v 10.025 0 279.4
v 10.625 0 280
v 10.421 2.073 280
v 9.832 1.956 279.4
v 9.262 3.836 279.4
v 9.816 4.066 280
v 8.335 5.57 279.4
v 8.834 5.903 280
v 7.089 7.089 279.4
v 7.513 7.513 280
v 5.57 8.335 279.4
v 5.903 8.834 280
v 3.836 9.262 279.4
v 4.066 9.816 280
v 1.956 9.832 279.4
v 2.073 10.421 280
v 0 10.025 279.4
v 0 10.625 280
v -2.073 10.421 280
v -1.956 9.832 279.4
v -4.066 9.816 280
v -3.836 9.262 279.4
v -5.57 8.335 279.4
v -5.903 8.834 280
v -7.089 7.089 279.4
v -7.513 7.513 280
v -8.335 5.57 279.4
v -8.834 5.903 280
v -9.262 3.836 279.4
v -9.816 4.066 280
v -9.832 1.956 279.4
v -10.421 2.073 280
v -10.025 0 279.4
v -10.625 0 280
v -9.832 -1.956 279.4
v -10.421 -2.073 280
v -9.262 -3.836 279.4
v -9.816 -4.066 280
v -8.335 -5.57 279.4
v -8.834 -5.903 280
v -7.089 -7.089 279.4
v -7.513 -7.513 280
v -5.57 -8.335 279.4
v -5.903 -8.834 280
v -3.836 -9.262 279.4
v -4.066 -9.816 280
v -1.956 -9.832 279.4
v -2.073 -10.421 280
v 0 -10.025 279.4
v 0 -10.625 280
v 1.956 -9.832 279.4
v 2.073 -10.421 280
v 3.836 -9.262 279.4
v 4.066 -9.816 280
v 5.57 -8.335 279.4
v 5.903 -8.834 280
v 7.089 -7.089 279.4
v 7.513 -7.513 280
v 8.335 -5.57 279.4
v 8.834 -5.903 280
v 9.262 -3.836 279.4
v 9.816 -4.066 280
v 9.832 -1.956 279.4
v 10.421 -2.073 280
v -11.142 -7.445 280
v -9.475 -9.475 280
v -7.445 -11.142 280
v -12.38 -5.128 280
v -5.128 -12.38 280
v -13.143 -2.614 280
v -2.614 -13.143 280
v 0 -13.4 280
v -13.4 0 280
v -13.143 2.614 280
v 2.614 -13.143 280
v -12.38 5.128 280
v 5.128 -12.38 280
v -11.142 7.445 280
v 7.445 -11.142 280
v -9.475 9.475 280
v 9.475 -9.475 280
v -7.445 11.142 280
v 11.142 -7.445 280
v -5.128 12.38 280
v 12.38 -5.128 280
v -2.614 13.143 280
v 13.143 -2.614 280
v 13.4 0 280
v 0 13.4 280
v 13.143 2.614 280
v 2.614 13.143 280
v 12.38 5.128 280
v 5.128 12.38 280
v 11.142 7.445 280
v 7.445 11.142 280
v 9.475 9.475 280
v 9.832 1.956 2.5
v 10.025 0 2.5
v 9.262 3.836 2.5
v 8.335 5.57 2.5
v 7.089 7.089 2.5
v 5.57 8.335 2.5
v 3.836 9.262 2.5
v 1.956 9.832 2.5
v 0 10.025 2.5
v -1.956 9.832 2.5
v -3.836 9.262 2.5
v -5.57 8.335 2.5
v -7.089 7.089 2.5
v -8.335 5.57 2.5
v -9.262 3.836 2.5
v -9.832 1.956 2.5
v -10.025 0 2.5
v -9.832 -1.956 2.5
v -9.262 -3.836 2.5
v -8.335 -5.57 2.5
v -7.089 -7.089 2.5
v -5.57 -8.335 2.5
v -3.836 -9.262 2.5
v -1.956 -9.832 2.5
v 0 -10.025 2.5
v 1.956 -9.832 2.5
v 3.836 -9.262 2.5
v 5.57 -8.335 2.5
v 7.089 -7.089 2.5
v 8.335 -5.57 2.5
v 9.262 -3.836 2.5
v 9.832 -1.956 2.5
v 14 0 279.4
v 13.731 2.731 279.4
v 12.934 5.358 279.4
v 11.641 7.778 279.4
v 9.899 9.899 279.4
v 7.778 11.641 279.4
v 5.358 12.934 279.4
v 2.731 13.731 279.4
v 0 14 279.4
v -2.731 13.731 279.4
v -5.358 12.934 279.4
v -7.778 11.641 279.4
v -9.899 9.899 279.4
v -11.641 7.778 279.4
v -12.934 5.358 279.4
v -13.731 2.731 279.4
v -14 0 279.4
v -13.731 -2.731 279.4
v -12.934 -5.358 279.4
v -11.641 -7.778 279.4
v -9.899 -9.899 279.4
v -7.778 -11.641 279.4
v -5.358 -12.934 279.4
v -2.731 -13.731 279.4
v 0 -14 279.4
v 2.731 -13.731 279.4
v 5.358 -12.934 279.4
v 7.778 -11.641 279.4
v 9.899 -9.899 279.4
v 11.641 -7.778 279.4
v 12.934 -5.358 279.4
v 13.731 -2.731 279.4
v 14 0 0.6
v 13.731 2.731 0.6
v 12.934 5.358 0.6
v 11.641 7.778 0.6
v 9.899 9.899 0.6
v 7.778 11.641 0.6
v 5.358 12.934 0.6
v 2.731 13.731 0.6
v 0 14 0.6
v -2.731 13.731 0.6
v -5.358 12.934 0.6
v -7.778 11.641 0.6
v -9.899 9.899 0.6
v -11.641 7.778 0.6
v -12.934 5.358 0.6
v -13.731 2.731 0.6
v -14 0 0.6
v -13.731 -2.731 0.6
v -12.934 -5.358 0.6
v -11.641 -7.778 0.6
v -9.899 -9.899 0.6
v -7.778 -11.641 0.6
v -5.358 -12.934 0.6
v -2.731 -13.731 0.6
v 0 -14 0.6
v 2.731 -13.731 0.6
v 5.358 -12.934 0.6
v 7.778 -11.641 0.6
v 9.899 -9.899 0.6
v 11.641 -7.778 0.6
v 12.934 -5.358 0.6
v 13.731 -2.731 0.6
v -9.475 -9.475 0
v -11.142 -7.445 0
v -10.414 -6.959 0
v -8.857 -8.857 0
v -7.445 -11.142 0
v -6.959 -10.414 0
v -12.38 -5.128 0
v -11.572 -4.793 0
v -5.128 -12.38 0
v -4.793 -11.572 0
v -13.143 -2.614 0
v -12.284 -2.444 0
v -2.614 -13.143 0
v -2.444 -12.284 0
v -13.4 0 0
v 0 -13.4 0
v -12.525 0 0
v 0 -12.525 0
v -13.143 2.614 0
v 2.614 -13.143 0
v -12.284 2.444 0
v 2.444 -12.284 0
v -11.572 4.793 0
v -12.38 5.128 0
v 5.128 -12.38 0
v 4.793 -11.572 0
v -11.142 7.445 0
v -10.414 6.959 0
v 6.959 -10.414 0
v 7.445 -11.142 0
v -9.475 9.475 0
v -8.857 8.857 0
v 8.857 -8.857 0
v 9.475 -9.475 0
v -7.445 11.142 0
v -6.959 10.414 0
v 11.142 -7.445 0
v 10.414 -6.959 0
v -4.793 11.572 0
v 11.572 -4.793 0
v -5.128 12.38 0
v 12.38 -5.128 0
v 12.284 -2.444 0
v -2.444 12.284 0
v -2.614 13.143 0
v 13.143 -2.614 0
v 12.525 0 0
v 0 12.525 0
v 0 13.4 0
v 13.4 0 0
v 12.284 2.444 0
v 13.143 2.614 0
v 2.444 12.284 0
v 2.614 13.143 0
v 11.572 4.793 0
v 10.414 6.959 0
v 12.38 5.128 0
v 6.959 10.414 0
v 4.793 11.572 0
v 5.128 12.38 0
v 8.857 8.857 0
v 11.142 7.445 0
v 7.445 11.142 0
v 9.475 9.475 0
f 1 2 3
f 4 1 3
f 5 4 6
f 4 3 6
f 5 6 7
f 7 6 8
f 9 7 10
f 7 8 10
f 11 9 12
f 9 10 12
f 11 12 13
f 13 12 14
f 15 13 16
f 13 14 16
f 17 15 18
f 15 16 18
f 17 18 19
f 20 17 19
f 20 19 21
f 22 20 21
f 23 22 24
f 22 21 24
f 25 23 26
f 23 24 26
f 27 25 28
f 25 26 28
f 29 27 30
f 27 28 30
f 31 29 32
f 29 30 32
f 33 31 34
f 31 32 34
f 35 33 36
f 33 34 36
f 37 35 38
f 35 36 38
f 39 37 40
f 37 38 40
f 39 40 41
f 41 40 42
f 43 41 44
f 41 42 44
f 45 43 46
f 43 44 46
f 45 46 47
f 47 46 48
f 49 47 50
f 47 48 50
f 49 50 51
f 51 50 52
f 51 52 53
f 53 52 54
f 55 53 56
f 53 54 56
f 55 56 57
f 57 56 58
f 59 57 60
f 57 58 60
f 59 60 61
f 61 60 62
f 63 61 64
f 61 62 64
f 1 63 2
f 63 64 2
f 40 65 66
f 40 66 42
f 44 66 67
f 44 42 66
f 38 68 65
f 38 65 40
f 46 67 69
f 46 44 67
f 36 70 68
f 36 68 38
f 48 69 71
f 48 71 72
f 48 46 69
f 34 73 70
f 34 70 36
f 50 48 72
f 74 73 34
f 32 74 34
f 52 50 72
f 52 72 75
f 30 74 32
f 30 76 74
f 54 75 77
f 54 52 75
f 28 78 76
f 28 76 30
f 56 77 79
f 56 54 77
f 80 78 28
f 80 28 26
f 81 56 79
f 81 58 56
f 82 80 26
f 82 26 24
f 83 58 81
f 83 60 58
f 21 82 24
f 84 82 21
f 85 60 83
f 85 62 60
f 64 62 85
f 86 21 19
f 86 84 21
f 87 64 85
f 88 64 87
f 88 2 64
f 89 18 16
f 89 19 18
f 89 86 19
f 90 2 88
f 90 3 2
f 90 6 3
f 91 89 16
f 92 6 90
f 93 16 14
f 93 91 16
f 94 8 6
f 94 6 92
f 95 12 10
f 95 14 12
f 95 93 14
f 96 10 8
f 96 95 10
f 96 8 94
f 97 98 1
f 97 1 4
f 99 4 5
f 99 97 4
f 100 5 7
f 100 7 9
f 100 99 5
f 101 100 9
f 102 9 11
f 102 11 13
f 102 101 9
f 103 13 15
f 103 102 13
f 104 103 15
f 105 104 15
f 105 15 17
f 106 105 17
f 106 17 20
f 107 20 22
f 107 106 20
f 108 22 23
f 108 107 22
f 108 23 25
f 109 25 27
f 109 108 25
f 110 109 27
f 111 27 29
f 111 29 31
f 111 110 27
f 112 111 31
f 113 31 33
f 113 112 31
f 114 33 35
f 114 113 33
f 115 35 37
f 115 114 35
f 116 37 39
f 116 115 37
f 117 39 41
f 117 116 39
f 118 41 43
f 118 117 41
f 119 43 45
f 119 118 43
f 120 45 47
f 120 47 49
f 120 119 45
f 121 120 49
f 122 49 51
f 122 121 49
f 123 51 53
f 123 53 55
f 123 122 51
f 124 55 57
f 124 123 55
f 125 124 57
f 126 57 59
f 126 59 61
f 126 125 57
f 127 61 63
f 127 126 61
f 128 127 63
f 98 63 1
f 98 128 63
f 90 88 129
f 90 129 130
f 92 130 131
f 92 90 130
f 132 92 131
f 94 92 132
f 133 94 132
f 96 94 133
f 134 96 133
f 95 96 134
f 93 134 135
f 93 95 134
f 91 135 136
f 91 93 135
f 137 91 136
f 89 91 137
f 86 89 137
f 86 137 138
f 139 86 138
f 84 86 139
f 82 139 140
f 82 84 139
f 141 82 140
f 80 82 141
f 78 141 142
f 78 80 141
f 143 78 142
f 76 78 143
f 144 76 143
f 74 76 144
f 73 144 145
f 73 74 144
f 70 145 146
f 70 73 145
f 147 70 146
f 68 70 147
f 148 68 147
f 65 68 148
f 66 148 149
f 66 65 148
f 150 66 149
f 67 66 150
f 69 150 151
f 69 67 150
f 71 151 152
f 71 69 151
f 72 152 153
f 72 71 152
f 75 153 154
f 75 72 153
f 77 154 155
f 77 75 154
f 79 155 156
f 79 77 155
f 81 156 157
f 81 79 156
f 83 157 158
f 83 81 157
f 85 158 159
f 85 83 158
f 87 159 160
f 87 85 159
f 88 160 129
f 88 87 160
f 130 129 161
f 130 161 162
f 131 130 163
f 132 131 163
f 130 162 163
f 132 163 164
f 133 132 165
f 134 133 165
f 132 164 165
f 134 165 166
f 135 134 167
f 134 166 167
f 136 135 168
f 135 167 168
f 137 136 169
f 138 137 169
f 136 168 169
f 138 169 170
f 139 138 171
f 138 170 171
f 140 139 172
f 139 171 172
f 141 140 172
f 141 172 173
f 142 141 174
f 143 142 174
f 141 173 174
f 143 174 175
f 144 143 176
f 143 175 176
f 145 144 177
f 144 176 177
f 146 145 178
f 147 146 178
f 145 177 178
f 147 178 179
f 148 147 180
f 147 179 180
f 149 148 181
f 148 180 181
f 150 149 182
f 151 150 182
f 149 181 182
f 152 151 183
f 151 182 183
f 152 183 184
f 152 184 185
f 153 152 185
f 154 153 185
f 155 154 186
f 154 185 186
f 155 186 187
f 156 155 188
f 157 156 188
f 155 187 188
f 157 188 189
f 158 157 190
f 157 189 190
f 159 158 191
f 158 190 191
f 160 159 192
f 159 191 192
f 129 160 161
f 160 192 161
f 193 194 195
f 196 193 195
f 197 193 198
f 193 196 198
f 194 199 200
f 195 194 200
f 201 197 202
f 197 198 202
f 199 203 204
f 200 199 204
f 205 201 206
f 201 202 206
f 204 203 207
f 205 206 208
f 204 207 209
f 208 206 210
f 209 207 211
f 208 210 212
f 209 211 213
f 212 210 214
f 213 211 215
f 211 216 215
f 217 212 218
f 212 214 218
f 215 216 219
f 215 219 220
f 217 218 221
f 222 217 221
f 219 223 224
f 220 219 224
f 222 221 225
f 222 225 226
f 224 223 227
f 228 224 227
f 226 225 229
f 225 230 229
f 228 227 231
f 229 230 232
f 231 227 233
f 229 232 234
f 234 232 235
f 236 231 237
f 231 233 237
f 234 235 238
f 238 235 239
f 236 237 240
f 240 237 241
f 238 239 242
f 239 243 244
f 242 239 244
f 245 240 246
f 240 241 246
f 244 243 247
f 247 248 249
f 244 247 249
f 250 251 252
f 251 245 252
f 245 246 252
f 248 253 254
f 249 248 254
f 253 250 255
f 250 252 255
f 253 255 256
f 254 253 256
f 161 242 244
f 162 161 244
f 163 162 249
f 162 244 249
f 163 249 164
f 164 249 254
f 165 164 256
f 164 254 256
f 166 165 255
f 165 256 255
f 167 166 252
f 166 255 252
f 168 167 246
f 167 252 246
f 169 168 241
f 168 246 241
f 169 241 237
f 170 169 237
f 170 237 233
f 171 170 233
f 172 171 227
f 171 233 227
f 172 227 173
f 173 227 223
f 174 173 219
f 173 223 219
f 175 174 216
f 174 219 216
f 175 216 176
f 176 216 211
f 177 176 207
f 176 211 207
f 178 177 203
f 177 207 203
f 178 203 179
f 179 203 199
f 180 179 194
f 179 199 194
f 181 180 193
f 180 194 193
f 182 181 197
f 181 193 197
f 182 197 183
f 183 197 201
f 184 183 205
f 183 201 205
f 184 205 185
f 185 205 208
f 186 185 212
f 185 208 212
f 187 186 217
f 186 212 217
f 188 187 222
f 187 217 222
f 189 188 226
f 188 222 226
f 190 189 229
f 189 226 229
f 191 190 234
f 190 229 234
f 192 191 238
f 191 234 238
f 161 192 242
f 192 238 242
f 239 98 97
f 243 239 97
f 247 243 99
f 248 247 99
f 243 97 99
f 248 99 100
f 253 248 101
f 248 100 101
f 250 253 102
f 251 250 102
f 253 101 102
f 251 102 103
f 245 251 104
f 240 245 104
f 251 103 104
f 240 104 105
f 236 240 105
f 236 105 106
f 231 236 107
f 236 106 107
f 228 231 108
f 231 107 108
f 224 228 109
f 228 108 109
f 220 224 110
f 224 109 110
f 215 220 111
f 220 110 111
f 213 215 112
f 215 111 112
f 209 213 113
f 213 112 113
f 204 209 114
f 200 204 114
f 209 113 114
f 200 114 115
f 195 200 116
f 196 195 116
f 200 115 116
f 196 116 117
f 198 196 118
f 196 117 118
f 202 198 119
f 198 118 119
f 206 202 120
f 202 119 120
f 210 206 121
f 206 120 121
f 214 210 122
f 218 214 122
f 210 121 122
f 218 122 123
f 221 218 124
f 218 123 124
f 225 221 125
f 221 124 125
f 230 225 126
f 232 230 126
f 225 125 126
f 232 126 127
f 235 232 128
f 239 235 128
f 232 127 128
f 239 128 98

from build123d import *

# Parameters (mm, degrees)
F0_R     = 14
F0_R_2   = 10.025
F1_DEPTH = 280
F2_SIZE  = 0.6
F3_SIZE  = 2.5


with BuildPart() as f1:
    # F0 (on Top) → F1 (new body)
    with BuildSketch(Plane.XY):
        Circle(F0_R)
        Circle(F0_R_2, mode=Mode.SUBTRACT)
    extrude(amount=F1_DEPTH)

    # F2
    f2_edges = [f1.edges().sort_by_distance(p)[0] for p in [
        (-10.025, 0, 280),
        (-14, 0, 280),
        (-14, 0, 0),
    ]]
    chamfer(f2_edges, length=F2_SIZE)

    # F3
    f3_edges = [f1.edges().sort_by_distance(p)[0] for p in [
        (-10.025, 0, 0),
    ]]
    chamfer(f3_edges, length=F3_SIZE)


solid = f1.part
